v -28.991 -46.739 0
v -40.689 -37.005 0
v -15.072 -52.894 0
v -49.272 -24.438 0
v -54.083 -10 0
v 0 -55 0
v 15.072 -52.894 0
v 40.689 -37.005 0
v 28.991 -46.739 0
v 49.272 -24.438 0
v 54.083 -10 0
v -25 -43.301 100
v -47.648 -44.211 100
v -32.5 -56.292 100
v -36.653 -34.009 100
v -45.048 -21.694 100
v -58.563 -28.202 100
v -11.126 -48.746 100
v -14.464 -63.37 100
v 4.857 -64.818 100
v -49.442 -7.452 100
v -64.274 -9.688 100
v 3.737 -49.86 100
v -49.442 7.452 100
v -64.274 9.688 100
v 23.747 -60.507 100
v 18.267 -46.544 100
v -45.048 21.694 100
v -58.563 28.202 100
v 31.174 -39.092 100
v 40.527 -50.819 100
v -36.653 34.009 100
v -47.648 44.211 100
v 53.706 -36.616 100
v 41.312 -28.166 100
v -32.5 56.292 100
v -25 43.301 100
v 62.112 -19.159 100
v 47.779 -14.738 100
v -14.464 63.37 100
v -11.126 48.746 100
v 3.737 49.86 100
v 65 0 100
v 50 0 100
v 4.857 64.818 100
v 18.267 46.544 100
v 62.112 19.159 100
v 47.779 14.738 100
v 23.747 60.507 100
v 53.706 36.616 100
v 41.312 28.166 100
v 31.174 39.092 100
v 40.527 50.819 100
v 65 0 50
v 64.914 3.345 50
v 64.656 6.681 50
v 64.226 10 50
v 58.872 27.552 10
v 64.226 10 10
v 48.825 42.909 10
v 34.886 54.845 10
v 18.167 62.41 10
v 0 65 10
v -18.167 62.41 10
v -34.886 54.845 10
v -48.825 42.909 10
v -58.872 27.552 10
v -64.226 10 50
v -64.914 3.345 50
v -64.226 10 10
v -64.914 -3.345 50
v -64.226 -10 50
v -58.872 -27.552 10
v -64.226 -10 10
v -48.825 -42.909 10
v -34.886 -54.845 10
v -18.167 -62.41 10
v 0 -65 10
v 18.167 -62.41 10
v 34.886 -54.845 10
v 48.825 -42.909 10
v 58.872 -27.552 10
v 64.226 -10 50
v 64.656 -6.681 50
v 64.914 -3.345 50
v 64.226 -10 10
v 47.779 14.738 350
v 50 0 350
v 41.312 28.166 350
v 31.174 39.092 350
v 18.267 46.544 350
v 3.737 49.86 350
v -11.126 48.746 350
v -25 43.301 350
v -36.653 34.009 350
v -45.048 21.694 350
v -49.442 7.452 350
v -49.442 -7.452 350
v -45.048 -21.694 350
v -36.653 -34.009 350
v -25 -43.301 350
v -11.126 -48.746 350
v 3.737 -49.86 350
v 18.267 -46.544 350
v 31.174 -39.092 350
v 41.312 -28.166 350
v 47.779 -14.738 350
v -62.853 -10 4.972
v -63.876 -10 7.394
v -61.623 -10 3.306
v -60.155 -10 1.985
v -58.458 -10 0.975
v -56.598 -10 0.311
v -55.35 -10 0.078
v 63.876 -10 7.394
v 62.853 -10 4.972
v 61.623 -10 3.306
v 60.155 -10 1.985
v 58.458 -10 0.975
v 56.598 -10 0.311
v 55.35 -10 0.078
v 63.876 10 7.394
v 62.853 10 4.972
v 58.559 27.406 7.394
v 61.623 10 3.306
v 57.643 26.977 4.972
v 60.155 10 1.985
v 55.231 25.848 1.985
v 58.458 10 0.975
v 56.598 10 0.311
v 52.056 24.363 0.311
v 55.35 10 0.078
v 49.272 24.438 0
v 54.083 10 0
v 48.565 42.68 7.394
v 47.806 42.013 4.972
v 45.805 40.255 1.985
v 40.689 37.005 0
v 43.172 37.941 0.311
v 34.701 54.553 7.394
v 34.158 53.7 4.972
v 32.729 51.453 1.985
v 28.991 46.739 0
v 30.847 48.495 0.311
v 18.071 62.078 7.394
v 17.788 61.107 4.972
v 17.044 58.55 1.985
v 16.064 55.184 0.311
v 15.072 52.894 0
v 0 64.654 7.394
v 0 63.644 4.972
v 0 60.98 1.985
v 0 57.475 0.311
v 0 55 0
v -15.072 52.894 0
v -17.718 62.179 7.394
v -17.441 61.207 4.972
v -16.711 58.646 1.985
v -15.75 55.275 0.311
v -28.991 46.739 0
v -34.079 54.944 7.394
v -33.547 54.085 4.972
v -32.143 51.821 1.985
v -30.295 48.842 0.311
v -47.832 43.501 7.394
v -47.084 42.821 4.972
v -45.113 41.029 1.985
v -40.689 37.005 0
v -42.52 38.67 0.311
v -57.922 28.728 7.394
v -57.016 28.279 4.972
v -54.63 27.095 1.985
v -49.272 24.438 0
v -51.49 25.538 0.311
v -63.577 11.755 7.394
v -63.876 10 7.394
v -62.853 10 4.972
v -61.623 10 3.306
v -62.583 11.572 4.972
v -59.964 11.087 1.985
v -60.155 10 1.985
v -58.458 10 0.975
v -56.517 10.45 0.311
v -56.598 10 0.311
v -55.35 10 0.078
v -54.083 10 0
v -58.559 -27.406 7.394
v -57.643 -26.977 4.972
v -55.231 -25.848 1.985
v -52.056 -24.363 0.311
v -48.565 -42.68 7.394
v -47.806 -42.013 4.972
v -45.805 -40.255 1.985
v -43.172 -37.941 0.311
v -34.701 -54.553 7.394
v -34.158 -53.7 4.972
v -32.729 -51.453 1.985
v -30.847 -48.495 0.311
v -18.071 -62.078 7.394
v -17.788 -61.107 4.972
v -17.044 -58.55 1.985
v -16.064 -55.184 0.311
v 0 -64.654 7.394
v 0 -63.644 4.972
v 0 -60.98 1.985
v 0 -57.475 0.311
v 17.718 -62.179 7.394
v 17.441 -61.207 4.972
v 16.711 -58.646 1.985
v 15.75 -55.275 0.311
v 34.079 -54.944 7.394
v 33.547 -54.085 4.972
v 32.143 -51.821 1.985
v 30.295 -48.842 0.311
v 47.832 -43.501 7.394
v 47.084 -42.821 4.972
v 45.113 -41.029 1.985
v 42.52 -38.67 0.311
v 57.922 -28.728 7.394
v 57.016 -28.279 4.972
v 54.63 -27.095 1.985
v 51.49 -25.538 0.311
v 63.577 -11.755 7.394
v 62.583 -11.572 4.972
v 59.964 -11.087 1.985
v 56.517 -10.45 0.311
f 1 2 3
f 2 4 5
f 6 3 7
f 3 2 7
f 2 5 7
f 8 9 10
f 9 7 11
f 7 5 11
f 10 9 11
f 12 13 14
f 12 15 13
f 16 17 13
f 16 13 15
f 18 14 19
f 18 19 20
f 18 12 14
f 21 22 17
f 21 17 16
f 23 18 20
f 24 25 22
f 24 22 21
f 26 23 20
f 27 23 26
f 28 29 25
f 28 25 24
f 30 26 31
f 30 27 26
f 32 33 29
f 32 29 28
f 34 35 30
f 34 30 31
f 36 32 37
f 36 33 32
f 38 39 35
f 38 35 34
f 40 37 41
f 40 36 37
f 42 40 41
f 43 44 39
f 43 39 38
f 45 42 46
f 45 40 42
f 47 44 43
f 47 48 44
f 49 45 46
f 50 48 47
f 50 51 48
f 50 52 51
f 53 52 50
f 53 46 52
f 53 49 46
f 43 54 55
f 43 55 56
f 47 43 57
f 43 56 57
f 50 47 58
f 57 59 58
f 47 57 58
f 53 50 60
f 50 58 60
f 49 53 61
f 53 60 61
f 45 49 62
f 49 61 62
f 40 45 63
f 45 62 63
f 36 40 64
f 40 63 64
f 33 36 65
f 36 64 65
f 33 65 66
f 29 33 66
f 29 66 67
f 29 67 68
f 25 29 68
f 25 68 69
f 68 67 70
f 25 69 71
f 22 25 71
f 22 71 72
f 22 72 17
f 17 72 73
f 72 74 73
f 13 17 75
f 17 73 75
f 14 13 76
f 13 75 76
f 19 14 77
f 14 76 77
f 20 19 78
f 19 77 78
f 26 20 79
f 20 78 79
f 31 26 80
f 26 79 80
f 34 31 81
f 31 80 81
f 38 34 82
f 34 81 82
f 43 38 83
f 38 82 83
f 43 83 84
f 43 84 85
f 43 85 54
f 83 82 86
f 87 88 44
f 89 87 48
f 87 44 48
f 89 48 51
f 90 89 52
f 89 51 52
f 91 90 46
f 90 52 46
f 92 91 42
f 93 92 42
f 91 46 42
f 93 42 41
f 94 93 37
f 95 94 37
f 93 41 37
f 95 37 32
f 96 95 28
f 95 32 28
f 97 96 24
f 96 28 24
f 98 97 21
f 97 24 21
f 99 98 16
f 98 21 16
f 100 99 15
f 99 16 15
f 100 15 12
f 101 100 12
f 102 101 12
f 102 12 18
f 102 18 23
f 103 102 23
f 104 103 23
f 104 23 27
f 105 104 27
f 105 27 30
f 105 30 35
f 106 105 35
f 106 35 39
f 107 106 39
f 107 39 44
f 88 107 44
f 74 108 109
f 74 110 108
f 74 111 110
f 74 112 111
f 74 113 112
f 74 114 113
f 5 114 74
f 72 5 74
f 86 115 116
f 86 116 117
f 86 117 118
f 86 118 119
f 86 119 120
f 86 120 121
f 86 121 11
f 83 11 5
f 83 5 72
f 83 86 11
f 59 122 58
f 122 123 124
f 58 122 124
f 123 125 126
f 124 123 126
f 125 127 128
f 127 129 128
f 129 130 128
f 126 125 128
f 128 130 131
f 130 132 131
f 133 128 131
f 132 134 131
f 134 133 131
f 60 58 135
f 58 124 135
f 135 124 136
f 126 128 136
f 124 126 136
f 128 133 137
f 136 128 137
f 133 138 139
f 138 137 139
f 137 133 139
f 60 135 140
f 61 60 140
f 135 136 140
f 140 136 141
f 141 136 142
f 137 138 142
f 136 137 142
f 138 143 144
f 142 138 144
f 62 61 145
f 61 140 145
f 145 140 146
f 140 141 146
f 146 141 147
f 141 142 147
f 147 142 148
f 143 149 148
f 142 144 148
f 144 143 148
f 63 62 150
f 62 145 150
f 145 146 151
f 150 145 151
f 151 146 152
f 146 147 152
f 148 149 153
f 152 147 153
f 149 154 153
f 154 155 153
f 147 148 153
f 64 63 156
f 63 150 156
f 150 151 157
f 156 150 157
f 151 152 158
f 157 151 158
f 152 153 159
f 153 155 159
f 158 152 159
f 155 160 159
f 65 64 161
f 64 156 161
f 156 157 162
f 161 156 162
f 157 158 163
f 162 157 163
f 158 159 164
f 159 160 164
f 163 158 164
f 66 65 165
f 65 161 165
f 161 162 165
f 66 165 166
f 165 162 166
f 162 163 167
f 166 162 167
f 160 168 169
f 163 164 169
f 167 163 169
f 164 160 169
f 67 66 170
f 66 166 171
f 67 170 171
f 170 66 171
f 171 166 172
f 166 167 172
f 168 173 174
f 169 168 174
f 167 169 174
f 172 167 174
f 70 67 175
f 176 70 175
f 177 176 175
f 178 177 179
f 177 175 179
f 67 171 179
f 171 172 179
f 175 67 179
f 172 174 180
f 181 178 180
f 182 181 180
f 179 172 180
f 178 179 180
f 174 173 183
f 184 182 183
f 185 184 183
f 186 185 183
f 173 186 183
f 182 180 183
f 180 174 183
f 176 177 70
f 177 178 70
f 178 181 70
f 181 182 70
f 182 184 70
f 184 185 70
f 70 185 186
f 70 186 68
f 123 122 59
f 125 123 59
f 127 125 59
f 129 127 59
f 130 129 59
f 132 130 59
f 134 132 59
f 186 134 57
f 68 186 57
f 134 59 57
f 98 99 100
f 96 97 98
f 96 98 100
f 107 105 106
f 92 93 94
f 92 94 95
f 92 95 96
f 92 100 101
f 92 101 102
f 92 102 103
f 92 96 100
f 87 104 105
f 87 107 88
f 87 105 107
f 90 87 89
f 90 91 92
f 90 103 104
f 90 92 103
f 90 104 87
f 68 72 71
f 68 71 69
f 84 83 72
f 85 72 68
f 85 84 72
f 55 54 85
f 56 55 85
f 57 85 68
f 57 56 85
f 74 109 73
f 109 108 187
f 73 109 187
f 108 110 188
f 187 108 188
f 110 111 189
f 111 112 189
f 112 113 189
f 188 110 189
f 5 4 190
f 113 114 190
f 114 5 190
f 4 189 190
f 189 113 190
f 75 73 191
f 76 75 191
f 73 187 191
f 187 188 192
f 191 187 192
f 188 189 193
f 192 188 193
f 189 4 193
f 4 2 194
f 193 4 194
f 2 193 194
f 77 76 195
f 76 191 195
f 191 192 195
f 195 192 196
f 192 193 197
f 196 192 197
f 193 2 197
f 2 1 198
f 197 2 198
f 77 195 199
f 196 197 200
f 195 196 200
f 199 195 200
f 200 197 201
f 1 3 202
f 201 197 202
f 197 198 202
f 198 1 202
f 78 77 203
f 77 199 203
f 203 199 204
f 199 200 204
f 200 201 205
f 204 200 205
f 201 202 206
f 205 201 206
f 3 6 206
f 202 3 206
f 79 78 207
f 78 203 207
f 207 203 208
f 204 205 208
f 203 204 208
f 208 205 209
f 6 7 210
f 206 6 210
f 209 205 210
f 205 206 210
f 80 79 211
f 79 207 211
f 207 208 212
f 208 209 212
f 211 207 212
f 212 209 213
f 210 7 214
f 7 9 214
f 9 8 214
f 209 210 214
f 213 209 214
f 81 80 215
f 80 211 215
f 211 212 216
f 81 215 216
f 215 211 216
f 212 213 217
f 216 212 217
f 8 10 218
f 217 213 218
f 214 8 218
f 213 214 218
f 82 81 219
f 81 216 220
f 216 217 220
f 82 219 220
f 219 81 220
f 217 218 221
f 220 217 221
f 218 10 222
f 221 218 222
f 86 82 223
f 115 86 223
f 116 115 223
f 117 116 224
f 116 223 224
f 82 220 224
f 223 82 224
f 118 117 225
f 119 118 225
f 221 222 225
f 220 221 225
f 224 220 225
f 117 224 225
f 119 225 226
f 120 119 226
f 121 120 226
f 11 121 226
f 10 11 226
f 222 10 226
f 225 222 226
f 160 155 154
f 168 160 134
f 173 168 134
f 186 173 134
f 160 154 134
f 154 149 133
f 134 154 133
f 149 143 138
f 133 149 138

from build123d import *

# Parameters (mm, degrees)
F0_R     = 50
F1_DEPTH = 350
F0_R_2   = 65
F2_DEPTH = 100
F3_R     = 10
F4_W     = 20
F4_H     = 53.732174
F5_DEPTH = 150


with BuildPart() as f1:
    # F0 (on Top) → F1 (new body)
    with BuildSketch(Plane.XY):
        Circle(F0_R)
    extrude(amount=F1_DEPTH)

    # F0 (on Top) → F2 (join)
    with BuildSketch(Plane.XY):
        Circle(F0_R_2)
        Circle(F0_R, mode=Mode.SUBTRACT)
    extrude(amount=F2_DEPTH)

    # F3
    f3_edges = [f1.edges().sort_by_distance(p)[0] for p in [
        (-65, 0, 0),
    ]]
    fillet(f3_edges, radius=F3_R)

    # F4 (on Right) → F5 (cut, symmetric)
    with BuildSketch(Plane.YZ):
        with Locations((0, 23.133913)):
            Rectangle(F4_W, F4_H)
    extrude(amount=F5_DEPTH, both=True, mode=Mode.SUBTRACT)


solid = f1.part
